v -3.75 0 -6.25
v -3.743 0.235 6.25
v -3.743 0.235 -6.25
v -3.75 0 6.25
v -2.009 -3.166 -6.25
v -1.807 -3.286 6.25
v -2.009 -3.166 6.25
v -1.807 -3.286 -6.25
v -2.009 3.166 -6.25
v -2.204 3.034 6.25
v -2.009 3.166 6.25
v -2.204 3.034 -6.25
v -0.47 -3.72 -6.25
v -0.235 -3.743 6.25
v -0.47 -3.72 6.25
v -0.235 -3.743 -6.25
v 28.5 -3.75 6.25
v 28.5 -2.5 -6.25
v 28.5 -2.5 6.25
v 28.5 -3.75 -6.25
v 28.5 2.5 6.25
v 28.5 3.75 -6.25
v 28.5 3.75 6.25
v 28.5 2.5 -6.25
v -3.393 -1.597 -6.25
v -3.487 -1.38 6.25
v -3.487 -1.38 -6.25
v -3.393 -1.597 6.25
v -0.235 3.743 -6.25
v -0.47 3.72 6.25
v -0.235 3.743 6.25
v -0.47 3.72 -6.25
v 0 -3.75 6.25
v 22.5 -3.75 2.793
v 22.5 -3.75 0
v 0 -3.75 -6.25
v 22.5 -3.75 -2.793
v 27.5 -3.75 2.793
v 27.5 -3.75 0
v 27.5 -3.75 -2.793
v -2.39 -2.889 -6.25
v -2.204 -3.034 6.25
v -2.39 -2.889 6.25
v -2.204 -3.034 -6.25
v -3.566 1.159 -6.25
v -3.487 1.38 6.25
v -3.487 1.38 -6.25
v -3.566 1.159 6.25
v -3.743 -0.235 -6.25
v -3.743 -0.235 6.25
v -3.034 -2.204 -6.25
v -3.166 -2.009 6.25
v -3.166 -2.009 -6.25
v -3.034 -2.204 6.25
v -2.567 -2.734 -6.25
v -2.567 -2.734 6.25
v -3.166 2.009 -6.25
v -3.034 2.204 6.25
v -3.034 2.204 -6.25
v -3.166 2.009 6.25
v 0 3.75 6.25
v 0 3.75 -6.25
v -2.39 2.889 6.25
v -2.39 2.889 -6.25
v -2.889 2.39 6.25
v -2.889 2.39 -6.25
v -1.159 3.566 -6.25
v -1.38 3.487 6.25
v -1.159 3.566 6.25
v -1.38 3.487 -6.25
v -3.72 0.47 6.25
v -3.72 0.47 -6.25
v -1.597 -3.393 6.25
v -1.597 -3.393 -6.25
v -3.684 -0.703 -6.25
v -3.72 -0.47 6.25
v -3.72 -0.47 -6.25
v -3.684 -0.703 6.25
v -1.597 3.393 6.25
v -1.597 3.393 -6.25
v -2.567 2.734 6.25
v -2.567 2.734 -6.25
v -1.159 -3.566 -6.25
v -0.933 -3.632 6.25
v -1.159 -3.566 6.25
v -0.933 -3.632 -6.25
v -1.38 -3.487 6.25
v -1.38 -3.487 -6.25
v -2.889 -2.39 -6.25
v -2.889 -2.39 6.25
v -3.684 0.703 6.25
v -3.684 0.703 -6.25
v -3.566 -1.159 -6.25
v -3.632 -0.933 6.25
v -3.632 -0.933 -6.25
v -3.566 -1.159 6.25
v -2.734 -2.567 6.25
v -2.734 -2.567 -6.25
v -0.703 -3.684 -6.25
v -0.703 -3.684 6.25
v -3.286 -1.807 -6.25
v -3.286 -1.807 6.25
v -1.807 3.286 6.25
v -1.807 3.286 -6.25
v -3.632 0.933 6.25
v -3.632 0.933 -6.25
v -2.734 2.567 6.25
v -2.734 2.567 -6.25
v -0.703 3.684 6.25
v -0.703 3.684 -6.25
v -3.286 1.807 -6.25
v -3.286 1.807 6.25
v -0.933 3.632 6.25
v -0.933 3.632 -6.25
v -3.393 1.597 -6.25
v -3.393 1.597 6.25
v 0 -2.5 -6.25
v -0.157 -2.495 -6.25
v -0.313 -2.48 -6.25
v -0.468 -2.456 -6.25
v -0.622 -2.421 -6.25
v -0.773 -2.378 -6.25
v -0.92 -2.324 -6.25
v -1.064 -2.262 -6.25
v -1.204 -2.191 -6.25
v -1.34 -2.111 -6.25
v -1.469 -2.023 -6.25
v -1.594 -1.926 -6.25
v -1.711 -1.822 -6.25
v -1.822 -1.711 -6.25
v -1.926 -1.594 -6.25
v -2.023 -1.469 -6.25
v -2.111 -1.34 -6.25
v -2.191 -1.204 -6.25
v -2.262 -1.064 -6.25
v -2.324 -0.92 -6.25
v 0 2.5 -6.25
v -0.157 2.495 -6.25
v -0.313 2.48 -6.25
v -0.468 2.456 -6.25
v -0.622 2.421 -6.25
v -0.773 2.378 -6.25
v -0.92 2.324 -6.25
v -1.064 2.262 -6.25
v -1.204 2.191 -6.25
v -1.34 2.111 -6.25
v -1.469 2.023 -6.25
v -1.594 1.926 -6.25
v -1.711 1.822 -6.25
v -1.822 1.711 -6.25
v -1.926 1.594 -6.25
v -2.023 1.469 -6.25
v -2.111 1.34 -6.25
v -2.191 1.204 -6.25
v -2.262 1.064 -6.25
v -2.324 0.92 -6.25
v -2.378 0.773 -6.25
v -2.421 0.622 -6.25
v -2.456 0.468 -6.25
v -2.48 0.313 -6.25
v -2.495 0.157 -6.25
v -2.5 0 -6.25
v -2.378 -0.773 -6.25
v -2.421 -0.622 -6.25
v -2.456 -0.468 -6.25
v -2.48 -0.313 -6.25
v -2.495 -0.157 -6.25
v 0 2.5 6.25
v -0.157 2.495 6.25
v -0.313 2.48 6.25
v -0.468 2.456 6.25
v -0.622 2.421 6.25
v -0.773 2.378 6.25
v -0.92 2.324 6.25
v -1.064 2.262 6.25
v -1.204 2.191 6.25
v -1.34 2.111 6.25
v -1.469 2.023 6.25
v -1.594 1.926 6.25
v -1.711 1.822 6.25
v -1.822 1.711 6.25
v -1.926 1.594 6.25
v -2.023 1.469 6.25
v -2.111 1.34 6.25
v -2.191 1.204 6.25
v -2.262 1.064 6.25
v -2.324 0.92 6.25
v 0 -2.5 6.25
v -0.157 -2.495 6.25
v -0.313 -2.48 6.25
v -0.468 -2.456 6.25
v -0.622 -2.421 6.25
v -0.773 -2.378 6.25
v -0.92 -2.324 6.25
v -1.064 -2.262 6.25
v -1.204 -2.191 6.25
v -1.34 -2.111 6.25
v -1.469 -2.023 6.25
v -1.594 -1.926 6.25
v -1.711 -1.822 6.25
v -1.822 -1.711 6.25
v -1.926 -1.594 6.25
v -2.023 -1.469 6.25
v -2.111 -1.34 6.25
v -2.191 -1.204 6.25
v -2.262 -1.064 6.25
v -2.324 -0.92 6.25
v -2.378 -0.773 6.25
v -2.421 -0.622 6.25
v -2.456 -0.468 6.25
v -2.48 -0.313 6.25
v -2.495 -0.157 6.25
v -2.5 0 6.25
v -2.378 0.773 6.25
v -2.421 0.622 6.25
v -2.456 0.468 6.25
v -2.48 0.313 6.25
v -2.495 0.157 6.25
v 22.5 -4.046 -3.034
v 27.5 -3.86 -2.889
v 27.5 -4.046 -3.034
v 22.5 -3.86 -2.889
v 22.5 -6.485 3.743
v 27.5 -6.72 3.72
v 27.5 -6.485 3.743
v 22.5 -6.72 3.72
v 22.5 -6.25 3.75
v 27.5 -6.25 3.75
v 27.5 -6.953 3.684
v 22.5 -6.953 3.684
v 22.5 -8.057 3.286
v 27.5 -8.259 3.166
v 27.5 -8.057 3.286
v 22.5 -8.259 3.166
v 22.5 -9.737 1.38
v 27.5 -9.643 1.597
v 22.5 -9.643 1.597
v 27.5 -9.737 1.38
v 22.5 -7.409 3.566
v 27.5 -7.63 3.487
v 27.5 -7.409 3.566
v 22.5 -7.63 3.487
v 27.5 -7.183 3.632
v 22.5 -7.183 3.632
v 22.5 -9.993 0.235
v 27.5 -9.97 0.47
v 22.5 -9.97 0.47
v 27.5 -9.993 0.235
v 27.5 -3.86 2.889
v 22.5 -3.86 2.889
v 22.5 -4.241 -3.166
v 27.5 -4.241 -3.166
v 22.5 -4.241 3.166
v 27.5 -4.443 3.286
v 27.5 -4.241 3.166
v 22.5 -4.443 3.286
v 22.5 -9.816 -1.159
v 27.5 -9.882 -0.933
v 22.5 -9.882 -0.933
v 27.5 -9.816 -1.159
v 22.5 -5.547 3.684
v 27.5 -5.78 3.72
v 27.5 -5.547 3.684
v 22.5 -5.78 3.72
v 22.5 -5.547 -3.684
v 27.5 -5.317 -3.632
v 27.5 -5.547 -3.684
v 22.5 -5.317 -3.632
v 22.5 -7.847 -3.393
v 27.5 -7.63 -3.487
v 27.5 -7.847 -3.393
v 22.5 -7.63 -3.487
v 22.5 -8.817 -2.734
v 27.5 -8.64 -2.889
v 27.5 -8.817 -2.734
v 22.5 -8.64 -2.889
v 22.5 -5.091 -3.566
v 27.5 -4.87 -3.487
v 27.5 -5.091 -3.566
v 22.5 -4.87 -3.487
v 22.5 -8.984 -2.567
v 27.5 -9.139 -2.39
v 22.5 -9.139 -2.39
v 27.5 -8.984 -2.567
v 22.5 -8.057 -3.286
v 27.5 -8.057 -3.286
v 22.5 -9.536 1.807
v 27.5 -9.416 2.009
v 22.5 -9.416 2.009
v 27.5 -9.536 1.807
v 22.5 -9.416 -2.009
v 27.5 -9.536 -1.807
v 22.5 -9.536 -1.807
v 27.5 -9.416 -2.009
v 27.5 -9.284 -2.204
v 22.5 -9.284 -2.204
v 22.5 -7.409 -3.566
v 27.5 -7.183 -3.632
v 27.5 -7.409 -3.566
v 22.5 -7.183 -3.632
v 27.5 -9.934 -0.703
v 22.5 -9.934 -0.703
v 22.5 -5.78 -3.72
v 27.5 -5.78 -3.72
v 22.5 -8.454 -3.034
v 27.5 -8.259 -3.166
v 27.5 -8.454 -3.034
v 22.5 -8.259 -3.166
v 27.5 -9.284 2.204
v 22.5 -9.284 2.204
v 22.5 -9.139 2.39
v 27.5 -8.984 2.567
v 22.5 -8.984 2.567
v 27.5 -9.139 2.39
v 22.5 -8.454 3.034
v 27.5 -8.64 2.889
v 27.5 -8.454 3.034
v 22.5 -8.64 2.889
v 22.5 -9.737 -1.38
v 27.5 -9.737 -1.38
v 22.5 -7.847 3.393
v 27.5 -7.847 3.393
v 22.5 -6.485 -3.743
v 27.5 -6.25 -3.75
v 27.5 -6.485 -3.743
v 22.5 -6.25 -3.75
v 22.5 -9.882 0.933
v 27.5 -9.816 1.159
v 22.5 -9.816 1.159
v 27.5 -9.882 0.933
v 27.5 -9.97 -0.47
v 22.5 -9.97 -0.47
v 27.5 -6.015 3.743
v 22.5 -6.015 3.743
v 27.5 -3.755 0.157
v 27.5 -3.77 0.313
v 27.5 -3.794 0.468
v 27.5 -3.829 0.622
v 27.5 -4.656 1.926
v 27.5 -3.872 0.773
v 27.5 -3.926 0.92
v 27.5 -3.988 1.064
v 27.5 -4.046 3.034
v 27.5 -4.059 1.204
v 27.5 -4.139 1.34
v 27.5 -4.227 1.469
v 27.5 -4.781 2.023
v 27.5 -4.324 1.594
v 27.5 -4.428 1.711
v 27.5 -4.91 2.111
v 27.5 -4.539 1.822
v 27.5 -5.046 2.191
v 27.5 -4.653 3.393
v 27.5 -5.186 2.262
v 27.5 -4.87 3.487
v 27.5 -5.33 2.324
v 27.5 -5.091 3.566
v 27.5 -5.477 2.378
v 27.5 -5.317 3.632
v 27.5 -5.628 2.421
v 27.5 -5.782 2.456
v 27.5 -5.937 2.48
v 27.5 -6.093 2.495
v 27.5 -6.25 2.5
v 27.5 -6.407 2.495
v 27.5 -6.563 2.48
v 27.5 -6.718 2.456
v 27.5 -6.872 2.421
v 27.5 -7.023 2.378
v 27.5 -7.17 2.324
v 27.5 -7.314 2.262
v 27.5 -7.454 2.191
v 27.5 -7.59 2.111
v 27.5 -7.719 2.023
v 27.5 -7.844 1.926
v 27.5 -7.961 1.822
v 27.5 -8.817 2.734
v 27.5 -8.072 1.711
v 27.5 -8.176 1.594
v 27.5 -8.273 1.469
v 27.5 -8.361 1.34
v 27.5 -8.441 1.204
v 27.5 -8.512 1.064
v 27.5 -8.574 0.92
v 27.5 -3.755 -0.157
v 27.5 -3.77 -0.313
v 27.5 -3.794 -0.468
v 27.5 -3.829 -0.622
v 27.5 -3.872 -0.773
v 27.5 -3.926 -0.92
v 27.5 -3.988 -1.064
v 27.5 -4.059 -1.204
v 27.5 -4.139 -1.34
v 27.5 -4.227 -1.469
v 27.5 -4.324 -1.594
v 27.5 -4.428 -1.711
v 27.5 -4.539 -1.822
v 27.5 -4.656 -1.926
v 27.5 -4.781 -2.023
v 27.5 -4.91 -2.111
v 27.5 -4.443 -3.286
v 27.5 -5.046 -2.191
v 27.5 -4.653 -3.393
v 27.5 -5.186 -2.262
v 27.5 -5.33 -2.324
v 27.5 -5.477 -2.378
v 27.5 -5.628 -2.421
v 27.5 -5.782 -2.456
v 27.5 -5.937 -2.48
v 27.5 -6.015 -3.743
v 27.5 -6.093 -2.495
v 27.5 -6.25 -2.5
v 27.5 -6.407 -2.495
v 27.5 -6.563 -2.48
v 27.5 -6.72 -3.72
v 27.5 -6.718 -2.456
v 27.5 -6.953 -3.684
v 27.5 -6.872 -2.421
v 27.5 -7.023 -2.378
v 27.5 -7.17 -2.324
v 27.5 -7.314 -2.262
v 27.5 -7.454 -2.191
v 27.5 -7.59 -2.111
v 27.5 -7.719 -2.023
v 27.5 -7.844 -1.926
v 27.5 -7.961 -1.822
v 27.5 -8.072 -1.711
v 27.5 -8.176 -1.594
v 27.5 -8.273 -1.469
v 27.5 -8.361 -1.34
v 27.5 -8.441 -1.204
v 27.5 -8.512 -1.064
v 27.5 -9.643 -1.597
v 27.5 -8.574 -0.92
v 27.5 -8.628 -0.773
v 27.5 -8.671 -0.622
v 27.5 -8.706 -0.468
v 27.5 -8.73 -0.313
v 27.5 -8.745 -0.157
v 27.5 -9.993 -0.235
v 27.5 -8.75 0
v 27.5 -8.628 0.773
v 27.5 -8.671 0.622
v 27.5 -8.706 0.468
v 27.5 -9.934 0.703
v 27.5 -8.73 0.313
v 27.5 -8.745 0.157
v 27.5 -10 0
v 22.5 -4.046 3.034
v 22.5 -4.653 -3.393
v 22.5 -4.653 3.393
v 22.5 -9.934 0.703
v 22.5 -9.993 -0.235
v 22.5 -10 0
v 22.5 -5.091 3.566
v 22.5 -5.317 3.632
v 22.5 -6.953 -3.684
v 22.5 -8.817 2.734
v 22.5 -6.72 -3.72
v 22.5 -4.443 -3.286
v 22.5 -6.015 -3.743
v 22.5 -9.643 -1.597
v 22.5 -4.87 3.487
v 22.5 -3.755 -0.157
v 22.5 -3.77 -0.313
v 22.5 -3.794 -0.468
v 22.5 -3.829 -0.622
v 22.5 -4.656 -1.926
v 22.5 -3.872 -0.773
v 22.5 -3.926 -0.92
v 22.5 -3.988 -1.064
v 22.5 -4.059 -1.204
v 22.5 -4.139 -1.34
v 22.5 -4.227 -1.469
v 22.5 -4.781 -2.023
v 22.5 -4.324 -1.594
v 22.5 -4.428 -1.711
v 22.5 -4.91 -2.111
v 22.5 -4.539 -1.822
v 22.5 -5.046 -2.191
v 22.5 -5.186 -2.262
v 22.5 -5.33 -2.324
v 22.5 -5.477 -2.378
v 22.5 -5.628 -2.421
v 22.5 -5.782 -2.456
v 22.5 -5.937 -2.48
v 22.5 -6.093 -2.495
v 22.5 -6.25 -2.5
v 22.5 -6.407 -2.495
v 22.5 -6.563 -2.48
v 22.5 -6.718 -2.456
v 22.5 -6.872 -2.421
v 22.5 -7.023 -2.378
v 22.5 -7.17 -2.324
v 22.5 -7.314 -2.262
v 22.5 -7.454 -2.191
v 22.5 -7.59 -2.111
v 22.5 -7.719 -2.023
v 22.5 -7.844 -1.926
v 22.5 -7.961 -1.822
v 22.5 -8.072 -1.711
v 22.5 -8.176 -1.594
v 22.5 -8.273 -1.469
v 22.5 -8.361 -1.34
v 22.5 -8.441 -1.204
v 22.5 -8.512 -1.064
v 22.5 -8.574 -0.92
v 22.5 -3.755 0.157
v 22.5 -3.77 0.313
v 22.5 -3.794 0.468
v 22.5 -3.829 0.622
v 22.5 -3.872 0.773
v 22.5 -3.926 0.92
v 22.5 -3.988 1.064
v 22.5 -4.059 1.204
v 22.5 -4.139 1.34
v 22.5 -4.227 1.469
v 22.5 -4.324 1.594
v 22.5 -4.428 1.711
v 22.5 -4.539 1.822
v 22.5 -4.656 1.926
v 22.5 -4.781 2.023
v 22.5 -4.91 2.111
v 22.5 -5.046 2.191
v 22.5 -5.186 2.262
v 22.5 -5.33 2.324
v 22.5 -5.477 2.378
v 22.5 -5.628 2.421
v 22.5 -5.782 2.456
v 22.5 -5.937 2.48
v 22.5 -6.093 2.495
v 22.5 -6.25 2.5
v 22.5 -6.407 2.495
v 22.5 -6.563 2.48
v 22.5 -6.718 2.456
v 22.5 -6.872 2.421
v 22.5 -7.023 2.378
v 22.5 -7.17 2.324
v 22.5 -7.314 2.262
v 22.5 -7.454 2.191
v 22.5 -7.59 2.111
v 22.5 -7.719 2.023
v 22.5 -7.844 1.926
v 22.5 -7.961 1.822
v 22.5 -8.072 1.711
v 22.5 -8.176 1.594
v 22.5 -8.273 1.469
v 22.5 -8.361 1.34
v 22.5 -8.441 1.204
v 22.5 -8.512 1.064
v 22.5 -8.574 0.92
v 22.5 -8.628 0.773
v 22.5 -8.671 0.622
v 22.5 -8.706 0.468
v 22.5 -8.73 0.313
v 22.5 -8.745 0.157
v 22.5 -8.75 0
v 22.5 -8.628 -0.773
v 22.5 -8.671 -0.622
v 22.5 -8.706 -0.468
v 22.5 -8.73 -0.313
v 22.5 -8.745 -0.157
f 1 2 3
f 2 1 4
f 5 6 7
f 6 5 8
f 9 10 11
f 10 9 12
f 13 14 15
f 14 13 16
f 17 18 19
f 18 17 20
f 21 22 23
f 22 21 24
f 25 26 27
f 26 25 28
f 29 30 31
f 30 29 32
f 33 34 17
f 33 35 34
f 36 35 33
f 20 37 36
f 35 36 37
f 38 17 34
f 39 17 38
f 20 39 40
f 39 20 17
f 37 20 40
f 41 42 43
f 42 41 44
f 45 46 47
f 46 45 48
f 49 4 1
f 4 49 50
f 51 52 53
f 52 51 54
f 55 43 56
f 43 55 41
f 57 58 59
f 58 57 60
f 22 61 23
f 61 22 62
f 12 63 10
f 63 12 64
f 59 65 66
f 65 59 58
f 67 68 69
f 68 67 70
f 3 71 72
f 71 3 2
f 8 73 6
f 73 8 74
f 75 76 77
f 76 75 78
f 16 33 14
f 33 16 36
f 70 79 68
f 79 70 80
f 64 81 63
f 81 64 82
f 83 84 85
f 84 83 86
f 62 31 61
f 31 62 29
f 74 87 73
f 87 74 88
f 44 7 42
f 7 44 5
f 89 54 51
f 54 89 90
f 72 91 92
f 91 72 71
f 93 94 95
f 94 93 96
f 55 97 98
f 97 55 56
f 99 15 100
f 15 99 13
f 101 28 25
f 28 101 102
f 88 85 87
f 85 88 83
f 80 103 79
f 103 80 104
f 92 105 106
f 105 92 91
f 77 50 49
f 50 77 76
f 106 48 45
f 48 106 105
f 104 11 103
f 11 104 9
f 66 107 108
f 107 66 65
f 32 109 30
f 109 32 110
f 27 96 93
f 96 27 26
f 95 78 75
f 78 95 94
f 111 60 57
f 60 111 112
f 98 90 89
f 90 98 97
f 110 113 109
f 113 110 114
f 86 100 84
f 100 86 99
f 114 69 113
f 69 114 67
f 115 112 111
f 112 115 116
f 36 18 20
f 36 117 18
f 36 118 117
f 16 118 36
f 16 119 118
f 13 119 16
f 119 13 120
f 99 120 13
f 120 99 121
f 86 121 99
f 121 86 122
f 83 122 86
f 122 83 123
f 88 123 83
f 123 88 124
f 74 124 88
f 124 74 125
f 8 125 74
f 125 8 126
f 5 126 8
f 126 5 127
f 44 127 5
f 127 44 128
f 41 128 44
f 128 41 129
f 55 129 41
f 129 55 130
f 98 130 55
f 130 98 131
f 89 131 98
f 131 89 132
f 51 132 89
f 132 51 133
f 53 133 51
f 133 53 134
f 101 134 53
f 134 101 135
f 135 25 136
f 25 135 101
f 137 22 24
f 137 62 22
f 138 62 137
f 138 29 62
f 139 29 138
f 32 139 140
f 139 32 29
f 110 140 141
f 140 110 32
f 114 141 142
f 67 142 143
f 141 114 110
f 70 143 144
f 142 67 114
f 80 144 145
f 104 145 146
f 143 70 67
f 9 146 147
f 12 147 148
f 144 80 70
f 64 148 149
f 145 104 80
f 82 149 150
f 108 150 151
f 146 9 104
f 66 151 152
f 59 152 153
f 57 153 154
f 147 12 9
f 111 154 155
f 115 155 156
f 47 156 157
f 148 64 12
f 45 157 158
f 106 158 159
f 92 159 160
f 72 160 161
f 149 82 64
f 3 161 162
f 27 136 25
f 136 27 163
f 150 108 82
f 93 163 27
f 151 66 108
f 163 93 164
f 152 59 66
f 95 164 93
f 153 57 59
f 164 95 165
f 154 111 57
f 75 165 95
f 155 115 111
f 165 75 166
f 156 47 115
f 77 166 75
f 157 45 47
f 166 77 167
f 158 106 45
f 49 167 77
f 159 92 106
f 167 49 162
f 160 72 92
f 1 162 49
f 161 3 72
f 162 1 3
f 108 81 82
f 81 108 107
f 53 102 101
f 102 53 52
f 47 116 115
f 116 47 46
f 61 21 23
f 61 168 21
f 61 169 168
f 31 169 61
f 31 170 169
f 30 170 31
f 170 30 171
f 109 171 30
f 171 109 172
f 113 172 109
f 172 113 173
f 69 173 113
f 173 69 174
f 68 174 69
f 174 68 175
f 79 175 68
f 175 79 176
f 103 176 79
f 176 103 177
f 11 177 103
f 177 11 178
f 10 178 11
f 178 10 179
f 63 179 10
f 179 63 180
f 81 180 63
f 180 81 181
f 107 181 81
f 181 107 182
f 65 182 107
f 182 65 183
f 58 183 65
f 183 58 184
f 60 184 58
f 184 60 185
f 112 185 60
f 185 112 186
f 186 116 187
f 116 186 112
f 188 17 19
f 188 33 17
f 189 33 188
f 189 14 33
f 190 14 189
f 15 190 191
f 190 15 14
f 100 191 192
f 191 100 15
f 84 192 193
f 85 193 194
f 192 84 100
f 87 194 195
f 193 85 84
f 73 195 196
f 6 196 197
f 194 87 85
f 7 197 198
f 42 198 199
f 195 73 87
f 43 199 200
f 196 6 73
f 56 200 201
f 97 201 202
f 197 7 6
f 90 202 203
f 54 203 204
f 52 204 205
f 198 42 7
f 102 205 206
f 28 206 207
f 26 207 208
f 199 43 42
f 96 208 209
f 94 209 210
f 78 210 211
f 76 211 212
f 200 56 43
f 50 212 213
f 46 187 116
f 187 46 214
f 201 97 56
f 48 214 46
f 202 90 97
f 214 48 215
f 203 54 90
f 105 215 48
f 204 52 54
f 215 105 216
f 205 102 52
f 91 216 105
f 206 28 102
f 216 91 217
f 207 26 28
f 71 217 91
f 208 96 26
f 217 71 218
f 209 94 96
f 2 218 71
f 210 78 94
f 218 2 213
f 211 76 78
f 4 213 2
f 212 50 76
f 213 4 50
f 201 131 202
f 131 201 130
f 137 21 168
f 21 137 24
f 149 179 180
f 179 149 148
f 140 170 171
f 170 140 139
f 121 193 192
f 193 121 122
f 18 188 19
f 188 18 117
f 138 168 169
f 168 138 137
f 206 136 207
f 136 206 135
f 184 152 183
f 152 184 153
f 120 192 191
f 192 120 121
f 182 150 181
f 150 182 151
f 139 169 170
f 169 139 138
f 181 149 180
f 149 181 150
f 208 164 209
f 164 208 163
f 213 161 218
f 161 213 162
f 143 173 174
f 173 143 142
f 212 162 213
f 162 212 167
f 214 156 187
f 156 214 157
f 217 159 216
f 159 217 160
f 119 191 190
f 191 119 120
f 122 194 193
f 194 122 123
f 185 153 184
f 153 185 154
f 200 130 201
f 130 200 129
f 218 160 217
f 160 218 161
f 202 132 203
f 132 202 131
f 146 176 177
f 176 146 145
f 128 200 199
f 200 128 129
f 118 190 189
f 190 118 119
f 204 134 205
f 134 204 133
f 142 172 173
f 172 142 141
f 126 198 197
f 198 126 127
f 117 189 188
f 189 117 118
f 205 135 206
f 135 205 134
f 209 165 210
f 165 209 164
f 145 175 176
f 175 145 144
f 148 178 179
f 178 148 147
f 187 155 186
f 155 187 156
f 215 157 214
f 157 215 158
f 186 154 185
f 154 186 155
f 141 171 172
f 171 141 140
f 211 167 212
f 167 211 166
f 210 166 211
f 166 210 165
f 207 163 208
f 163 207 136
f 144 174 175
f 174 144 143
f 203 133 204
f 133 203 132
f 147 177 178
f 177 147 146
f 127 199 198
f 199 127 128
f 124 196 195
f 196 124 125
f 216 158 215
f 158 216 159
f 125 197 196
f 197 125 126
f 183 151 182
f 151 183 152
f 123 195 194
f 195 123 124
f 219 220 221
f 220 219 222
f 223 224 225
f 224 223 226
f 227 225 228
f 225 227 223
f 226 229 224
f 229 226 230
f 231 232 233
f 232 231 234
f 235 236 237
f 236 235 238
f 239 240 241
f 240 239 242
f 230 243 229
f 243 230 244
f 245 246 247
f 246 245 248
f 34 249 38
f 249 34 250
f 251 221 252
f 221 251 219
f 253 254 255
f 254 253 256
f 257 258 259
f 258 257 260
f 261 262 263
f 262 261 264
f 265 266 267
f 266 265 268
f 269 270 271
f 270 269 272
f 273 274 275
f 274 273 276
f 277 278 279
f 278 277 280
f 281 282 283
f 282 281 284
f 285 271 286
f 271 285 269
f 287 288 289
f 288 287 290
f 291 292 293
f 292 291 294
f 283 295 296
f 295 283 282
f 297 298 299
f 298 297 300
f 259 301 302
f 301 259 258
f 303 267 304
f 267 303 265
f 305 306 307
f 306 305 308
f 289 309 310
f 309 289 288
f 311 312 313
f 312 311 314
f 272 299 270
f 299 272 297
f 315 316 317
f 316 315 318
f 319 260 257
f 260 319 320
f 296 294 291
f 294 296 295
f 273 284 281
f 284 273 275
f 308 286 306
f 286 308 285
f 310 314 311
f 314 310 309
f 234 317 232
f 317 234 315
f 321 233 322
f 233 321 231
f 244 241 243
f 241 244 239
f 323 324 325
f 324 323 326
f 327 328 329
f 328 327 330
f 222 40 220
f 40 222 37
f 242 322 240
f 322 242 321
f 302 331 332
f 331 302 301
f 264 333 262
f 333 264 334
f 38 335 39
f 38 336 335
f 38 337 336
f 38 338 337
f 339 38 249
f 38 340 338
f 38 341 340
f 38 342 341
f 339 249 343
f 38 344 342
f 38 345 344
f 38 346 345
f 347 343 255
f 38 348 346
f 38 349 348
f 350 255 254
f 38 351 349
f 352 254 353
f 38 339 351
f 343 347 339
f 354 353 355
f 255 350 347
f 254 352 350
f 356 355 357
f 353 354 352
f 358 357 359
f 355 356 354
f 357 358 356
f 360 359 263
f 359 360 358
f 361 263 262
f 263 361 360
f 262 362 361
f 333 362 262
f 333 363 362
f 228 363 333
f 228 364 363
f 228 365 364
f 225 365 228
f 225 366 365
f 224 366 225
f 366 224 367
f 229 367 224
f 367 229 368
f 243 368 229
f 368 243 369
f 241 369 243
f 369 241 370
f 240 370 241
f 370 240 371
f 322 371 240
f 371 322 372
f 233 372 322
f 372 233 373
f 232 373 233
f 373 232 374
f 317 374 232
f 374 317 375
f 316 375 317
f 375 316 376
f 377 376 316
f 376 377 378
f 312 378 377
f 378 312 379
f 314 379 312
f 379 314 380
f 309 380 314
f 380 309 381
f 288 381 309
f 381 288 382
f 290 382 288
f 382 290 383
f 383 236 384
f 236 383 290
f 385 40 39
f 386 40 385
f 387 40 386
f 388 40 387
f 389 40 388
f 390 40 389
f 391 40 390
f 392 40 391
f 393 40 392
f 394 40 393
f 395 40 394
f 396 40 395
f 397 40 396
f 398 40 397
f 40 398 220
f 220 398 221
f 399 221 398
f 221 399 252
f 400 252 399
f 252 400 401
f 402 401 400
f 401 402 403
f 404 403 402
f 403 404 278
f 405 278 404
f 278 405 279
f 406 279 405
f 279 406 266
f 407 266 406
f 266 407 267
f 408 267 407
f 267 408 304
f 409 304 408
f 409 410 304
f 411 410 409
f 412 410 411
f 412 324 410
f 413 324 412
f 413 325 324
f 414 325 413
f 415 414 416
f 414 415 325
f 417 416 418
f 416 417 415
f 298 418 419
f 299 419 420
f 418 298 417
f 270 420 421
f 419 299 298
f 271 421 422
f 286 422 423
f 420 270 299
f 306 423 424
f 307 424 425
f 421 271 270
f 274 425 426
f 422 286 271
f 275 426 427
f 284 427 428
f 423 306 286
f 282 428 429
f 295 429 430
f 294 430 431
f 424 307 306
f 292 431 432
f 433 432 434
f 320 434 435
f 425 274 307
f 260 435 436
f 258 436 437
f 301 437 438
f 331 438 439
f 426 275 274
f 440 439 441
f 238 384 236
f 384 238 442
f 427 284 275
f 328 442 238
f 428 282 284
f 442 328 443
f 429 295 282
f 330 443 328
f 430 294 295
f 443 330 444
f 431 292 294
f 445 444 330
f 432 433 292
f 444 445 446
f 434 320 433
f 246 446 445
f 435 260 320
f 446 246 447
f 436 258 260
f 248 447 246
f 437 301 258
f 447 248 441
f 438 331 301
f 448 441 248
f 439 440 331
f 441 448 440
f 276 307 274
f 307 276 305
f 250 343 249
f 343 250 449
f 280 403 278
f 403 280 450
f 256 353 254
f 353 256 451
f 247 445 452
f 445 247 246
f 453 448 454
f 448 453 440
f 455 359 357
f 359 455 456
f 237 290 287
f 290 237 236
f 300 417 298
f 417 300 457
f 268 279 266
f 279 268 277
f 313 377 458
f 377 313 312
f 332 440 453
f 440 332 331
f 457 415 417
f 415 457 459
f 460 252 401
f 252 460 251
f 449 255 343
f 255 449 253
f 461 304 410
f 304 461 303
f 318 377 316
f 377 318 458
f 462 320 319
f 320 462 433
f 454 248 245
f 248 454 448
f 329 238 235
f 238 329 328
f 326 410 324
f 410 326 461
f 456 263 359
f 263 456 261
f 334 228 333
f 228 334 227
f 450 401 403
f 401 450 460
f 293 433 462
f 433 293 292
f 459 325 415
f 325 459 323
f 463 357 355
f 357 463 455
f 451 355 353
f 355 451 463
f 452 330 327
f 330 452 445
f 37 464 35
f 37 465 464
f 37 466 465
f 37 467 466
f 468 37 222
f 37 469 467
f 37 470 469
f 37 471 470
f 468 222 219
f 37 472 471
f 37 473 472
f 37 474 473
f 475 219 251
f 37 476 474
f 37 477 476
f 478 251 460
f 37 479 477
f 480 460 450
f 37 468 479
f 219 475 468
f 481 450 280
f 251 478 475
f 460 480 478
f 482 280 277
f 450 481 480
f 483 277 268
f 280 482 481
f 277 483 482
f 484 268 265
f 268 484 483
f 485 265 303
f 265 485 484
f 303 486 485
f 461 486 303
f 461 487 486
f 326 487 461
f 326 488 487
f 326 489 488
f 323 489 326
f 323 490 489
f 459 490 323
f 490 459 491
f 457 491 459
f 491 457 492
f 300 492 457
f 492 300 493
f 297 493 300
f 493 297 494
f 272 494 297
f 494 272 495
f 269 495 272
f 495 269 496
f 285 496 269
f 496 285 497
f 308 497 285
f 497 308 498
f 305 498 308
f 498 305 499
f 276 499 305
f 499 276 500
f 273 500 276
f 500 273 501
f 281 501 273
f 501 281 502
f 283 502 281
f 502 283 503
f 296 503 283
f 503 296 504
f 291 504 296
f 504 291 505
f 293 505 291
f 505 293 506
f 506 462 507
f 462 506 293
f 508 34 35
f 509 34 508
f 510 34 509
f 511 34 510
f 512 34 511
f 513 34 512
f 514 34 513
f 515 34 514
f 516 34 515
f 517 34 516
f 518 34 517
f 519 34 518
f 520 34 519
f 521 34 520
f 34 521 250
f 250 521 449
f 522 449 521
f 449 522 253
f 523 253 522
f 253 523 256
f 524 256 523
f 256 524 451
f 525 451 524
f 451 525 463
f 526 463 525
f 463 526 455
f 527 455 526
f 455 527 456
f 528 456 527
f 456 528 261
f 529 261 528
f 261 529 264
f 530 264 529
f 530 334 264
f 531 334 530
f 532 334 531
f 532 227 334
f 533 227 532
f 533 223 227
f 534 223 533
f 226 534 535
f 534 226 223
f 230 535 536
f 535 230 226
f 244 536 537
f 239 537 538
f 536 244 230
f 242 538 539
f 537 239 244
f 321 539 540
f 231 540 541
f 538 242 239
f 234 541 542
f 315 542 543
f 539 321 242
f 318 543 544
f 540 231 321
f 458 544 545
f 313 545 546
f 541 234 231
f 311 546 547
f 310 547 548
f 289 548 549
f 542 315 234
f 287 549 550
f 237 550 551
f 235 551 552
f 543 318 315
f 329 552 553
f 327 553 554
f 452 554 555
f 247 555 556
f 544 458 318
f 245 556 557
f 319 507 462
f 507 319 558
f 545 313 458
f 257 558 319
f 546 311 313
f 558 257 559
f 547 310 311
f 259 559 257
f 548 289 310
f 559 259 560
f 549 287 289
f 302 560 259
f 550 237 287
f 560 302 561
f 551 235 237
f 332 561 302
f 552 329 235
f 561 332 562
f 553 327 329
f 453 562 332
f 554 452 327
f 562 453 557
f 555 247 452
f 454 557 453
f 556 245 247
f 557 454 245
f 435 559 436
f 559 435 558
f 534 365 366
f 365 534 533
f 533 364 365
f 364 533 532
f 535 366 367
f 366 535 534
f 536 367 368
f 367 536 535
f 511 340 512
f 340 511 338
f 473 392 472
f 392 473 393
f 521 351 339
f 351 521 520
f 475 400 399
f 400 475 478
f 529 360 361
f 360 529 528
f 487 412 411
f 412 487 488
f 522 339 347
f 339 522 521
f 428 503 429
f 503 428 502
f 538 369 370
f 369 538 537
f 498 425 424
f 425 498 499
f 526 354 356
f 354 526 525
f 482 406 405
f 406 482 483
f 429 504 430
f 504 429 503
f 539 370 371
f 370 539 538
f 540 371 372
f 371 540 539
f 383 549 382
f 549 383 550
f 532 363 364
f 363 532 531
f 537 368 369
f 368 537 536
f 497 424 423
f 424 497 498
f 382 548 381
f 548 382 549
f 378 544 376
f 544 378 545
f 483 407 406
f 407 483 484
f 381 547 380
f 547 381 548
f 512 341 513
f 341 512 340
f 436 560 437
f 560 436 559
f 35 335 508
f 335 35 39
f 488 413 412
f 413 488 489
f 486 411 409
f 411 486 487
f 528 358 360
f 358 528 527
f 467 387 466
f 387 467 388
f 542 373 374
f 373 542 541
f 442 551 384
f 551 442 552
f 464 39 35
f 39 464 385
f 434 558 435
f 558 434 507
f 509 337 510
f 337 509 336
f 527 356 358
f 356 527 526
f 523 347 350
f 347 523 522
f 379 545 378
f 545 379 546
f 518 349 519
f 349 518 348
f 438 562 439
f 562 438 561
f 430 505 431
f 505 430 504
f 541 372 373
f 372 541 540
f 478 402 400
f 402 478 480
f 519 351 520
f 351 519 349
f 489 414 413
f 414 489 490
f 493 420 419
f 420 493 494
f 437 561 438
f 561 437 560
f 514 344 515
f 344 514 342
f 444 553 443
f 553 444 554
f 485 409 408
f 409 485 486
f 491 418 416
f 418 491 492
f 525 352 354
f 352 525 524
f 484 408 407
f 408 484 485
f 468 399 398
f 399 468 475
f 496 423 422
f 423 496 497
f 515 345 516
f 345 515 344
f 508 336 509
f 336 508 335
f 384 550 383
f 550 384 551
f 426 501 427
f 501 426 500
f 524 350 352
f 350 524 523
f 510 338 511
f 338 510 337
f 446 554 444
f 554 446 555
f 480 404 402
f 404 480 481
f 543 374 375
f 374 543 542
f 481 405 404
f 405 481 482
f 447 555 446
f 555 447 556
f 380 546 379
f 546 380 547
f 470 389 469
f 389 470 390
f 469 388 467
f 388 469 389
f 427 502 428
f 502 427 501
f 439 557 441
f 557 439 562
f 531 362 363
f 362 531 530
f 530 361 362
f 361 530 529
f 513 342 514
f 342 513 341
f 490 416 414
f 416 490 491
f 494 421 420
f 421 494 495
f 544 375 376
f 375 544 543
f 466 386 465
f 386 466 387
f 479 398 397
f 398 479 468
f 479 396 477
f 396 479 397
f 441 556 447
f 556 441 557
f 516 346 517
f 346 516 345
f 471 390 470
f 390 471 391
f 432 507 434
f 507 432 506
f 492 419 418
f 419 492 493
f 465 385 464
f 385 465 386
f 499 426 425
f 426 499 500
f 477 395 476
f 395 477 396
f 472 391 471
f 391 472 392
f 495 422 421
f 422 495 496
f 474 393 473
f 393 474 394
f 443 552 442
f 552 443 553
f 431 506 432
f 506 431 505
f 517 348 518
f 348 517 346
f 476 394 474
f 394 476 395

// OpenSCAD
$fn=100;

thickness=2.5;
clip_length=thickness*12;
clip_width=thickness*5;
fiddle=1;

module clip_shape(height, width, length) {
    end_cube_thickness=3;
    hull() {
        translate([length-end_cube_thickness, 0, 0]) {
           cube([end_cube_thickness, width, height], center=true);
        }
        rotate([90, 0, 0]) cylinder(h=width, d=height, center=true);
    }
}

module clip_loop() {
    height=clip_length/6;
    translate([clip_length-height, 0, thickness*2.5]) {
        rotate([90, 0, 90]) {
            difference() {
                cylinder(h=height, d=thickness*3, center=true);
                cylinder(h=height+fiddle, d=thickness*2, center=true);
            }
        }
    }
}

module hollowed_clip_shape() {
    difference() {
       clip_shape(3*thickness, clip_width, clip_length);
       clip_shape(2*thickness, clip_width+fiddle, clip_length+fiddle);
    }
}

module body() {
    rotate([90, 0, 0]) {
        hollowed_clip_shape();
        clip_loop();
    }
}

body();
